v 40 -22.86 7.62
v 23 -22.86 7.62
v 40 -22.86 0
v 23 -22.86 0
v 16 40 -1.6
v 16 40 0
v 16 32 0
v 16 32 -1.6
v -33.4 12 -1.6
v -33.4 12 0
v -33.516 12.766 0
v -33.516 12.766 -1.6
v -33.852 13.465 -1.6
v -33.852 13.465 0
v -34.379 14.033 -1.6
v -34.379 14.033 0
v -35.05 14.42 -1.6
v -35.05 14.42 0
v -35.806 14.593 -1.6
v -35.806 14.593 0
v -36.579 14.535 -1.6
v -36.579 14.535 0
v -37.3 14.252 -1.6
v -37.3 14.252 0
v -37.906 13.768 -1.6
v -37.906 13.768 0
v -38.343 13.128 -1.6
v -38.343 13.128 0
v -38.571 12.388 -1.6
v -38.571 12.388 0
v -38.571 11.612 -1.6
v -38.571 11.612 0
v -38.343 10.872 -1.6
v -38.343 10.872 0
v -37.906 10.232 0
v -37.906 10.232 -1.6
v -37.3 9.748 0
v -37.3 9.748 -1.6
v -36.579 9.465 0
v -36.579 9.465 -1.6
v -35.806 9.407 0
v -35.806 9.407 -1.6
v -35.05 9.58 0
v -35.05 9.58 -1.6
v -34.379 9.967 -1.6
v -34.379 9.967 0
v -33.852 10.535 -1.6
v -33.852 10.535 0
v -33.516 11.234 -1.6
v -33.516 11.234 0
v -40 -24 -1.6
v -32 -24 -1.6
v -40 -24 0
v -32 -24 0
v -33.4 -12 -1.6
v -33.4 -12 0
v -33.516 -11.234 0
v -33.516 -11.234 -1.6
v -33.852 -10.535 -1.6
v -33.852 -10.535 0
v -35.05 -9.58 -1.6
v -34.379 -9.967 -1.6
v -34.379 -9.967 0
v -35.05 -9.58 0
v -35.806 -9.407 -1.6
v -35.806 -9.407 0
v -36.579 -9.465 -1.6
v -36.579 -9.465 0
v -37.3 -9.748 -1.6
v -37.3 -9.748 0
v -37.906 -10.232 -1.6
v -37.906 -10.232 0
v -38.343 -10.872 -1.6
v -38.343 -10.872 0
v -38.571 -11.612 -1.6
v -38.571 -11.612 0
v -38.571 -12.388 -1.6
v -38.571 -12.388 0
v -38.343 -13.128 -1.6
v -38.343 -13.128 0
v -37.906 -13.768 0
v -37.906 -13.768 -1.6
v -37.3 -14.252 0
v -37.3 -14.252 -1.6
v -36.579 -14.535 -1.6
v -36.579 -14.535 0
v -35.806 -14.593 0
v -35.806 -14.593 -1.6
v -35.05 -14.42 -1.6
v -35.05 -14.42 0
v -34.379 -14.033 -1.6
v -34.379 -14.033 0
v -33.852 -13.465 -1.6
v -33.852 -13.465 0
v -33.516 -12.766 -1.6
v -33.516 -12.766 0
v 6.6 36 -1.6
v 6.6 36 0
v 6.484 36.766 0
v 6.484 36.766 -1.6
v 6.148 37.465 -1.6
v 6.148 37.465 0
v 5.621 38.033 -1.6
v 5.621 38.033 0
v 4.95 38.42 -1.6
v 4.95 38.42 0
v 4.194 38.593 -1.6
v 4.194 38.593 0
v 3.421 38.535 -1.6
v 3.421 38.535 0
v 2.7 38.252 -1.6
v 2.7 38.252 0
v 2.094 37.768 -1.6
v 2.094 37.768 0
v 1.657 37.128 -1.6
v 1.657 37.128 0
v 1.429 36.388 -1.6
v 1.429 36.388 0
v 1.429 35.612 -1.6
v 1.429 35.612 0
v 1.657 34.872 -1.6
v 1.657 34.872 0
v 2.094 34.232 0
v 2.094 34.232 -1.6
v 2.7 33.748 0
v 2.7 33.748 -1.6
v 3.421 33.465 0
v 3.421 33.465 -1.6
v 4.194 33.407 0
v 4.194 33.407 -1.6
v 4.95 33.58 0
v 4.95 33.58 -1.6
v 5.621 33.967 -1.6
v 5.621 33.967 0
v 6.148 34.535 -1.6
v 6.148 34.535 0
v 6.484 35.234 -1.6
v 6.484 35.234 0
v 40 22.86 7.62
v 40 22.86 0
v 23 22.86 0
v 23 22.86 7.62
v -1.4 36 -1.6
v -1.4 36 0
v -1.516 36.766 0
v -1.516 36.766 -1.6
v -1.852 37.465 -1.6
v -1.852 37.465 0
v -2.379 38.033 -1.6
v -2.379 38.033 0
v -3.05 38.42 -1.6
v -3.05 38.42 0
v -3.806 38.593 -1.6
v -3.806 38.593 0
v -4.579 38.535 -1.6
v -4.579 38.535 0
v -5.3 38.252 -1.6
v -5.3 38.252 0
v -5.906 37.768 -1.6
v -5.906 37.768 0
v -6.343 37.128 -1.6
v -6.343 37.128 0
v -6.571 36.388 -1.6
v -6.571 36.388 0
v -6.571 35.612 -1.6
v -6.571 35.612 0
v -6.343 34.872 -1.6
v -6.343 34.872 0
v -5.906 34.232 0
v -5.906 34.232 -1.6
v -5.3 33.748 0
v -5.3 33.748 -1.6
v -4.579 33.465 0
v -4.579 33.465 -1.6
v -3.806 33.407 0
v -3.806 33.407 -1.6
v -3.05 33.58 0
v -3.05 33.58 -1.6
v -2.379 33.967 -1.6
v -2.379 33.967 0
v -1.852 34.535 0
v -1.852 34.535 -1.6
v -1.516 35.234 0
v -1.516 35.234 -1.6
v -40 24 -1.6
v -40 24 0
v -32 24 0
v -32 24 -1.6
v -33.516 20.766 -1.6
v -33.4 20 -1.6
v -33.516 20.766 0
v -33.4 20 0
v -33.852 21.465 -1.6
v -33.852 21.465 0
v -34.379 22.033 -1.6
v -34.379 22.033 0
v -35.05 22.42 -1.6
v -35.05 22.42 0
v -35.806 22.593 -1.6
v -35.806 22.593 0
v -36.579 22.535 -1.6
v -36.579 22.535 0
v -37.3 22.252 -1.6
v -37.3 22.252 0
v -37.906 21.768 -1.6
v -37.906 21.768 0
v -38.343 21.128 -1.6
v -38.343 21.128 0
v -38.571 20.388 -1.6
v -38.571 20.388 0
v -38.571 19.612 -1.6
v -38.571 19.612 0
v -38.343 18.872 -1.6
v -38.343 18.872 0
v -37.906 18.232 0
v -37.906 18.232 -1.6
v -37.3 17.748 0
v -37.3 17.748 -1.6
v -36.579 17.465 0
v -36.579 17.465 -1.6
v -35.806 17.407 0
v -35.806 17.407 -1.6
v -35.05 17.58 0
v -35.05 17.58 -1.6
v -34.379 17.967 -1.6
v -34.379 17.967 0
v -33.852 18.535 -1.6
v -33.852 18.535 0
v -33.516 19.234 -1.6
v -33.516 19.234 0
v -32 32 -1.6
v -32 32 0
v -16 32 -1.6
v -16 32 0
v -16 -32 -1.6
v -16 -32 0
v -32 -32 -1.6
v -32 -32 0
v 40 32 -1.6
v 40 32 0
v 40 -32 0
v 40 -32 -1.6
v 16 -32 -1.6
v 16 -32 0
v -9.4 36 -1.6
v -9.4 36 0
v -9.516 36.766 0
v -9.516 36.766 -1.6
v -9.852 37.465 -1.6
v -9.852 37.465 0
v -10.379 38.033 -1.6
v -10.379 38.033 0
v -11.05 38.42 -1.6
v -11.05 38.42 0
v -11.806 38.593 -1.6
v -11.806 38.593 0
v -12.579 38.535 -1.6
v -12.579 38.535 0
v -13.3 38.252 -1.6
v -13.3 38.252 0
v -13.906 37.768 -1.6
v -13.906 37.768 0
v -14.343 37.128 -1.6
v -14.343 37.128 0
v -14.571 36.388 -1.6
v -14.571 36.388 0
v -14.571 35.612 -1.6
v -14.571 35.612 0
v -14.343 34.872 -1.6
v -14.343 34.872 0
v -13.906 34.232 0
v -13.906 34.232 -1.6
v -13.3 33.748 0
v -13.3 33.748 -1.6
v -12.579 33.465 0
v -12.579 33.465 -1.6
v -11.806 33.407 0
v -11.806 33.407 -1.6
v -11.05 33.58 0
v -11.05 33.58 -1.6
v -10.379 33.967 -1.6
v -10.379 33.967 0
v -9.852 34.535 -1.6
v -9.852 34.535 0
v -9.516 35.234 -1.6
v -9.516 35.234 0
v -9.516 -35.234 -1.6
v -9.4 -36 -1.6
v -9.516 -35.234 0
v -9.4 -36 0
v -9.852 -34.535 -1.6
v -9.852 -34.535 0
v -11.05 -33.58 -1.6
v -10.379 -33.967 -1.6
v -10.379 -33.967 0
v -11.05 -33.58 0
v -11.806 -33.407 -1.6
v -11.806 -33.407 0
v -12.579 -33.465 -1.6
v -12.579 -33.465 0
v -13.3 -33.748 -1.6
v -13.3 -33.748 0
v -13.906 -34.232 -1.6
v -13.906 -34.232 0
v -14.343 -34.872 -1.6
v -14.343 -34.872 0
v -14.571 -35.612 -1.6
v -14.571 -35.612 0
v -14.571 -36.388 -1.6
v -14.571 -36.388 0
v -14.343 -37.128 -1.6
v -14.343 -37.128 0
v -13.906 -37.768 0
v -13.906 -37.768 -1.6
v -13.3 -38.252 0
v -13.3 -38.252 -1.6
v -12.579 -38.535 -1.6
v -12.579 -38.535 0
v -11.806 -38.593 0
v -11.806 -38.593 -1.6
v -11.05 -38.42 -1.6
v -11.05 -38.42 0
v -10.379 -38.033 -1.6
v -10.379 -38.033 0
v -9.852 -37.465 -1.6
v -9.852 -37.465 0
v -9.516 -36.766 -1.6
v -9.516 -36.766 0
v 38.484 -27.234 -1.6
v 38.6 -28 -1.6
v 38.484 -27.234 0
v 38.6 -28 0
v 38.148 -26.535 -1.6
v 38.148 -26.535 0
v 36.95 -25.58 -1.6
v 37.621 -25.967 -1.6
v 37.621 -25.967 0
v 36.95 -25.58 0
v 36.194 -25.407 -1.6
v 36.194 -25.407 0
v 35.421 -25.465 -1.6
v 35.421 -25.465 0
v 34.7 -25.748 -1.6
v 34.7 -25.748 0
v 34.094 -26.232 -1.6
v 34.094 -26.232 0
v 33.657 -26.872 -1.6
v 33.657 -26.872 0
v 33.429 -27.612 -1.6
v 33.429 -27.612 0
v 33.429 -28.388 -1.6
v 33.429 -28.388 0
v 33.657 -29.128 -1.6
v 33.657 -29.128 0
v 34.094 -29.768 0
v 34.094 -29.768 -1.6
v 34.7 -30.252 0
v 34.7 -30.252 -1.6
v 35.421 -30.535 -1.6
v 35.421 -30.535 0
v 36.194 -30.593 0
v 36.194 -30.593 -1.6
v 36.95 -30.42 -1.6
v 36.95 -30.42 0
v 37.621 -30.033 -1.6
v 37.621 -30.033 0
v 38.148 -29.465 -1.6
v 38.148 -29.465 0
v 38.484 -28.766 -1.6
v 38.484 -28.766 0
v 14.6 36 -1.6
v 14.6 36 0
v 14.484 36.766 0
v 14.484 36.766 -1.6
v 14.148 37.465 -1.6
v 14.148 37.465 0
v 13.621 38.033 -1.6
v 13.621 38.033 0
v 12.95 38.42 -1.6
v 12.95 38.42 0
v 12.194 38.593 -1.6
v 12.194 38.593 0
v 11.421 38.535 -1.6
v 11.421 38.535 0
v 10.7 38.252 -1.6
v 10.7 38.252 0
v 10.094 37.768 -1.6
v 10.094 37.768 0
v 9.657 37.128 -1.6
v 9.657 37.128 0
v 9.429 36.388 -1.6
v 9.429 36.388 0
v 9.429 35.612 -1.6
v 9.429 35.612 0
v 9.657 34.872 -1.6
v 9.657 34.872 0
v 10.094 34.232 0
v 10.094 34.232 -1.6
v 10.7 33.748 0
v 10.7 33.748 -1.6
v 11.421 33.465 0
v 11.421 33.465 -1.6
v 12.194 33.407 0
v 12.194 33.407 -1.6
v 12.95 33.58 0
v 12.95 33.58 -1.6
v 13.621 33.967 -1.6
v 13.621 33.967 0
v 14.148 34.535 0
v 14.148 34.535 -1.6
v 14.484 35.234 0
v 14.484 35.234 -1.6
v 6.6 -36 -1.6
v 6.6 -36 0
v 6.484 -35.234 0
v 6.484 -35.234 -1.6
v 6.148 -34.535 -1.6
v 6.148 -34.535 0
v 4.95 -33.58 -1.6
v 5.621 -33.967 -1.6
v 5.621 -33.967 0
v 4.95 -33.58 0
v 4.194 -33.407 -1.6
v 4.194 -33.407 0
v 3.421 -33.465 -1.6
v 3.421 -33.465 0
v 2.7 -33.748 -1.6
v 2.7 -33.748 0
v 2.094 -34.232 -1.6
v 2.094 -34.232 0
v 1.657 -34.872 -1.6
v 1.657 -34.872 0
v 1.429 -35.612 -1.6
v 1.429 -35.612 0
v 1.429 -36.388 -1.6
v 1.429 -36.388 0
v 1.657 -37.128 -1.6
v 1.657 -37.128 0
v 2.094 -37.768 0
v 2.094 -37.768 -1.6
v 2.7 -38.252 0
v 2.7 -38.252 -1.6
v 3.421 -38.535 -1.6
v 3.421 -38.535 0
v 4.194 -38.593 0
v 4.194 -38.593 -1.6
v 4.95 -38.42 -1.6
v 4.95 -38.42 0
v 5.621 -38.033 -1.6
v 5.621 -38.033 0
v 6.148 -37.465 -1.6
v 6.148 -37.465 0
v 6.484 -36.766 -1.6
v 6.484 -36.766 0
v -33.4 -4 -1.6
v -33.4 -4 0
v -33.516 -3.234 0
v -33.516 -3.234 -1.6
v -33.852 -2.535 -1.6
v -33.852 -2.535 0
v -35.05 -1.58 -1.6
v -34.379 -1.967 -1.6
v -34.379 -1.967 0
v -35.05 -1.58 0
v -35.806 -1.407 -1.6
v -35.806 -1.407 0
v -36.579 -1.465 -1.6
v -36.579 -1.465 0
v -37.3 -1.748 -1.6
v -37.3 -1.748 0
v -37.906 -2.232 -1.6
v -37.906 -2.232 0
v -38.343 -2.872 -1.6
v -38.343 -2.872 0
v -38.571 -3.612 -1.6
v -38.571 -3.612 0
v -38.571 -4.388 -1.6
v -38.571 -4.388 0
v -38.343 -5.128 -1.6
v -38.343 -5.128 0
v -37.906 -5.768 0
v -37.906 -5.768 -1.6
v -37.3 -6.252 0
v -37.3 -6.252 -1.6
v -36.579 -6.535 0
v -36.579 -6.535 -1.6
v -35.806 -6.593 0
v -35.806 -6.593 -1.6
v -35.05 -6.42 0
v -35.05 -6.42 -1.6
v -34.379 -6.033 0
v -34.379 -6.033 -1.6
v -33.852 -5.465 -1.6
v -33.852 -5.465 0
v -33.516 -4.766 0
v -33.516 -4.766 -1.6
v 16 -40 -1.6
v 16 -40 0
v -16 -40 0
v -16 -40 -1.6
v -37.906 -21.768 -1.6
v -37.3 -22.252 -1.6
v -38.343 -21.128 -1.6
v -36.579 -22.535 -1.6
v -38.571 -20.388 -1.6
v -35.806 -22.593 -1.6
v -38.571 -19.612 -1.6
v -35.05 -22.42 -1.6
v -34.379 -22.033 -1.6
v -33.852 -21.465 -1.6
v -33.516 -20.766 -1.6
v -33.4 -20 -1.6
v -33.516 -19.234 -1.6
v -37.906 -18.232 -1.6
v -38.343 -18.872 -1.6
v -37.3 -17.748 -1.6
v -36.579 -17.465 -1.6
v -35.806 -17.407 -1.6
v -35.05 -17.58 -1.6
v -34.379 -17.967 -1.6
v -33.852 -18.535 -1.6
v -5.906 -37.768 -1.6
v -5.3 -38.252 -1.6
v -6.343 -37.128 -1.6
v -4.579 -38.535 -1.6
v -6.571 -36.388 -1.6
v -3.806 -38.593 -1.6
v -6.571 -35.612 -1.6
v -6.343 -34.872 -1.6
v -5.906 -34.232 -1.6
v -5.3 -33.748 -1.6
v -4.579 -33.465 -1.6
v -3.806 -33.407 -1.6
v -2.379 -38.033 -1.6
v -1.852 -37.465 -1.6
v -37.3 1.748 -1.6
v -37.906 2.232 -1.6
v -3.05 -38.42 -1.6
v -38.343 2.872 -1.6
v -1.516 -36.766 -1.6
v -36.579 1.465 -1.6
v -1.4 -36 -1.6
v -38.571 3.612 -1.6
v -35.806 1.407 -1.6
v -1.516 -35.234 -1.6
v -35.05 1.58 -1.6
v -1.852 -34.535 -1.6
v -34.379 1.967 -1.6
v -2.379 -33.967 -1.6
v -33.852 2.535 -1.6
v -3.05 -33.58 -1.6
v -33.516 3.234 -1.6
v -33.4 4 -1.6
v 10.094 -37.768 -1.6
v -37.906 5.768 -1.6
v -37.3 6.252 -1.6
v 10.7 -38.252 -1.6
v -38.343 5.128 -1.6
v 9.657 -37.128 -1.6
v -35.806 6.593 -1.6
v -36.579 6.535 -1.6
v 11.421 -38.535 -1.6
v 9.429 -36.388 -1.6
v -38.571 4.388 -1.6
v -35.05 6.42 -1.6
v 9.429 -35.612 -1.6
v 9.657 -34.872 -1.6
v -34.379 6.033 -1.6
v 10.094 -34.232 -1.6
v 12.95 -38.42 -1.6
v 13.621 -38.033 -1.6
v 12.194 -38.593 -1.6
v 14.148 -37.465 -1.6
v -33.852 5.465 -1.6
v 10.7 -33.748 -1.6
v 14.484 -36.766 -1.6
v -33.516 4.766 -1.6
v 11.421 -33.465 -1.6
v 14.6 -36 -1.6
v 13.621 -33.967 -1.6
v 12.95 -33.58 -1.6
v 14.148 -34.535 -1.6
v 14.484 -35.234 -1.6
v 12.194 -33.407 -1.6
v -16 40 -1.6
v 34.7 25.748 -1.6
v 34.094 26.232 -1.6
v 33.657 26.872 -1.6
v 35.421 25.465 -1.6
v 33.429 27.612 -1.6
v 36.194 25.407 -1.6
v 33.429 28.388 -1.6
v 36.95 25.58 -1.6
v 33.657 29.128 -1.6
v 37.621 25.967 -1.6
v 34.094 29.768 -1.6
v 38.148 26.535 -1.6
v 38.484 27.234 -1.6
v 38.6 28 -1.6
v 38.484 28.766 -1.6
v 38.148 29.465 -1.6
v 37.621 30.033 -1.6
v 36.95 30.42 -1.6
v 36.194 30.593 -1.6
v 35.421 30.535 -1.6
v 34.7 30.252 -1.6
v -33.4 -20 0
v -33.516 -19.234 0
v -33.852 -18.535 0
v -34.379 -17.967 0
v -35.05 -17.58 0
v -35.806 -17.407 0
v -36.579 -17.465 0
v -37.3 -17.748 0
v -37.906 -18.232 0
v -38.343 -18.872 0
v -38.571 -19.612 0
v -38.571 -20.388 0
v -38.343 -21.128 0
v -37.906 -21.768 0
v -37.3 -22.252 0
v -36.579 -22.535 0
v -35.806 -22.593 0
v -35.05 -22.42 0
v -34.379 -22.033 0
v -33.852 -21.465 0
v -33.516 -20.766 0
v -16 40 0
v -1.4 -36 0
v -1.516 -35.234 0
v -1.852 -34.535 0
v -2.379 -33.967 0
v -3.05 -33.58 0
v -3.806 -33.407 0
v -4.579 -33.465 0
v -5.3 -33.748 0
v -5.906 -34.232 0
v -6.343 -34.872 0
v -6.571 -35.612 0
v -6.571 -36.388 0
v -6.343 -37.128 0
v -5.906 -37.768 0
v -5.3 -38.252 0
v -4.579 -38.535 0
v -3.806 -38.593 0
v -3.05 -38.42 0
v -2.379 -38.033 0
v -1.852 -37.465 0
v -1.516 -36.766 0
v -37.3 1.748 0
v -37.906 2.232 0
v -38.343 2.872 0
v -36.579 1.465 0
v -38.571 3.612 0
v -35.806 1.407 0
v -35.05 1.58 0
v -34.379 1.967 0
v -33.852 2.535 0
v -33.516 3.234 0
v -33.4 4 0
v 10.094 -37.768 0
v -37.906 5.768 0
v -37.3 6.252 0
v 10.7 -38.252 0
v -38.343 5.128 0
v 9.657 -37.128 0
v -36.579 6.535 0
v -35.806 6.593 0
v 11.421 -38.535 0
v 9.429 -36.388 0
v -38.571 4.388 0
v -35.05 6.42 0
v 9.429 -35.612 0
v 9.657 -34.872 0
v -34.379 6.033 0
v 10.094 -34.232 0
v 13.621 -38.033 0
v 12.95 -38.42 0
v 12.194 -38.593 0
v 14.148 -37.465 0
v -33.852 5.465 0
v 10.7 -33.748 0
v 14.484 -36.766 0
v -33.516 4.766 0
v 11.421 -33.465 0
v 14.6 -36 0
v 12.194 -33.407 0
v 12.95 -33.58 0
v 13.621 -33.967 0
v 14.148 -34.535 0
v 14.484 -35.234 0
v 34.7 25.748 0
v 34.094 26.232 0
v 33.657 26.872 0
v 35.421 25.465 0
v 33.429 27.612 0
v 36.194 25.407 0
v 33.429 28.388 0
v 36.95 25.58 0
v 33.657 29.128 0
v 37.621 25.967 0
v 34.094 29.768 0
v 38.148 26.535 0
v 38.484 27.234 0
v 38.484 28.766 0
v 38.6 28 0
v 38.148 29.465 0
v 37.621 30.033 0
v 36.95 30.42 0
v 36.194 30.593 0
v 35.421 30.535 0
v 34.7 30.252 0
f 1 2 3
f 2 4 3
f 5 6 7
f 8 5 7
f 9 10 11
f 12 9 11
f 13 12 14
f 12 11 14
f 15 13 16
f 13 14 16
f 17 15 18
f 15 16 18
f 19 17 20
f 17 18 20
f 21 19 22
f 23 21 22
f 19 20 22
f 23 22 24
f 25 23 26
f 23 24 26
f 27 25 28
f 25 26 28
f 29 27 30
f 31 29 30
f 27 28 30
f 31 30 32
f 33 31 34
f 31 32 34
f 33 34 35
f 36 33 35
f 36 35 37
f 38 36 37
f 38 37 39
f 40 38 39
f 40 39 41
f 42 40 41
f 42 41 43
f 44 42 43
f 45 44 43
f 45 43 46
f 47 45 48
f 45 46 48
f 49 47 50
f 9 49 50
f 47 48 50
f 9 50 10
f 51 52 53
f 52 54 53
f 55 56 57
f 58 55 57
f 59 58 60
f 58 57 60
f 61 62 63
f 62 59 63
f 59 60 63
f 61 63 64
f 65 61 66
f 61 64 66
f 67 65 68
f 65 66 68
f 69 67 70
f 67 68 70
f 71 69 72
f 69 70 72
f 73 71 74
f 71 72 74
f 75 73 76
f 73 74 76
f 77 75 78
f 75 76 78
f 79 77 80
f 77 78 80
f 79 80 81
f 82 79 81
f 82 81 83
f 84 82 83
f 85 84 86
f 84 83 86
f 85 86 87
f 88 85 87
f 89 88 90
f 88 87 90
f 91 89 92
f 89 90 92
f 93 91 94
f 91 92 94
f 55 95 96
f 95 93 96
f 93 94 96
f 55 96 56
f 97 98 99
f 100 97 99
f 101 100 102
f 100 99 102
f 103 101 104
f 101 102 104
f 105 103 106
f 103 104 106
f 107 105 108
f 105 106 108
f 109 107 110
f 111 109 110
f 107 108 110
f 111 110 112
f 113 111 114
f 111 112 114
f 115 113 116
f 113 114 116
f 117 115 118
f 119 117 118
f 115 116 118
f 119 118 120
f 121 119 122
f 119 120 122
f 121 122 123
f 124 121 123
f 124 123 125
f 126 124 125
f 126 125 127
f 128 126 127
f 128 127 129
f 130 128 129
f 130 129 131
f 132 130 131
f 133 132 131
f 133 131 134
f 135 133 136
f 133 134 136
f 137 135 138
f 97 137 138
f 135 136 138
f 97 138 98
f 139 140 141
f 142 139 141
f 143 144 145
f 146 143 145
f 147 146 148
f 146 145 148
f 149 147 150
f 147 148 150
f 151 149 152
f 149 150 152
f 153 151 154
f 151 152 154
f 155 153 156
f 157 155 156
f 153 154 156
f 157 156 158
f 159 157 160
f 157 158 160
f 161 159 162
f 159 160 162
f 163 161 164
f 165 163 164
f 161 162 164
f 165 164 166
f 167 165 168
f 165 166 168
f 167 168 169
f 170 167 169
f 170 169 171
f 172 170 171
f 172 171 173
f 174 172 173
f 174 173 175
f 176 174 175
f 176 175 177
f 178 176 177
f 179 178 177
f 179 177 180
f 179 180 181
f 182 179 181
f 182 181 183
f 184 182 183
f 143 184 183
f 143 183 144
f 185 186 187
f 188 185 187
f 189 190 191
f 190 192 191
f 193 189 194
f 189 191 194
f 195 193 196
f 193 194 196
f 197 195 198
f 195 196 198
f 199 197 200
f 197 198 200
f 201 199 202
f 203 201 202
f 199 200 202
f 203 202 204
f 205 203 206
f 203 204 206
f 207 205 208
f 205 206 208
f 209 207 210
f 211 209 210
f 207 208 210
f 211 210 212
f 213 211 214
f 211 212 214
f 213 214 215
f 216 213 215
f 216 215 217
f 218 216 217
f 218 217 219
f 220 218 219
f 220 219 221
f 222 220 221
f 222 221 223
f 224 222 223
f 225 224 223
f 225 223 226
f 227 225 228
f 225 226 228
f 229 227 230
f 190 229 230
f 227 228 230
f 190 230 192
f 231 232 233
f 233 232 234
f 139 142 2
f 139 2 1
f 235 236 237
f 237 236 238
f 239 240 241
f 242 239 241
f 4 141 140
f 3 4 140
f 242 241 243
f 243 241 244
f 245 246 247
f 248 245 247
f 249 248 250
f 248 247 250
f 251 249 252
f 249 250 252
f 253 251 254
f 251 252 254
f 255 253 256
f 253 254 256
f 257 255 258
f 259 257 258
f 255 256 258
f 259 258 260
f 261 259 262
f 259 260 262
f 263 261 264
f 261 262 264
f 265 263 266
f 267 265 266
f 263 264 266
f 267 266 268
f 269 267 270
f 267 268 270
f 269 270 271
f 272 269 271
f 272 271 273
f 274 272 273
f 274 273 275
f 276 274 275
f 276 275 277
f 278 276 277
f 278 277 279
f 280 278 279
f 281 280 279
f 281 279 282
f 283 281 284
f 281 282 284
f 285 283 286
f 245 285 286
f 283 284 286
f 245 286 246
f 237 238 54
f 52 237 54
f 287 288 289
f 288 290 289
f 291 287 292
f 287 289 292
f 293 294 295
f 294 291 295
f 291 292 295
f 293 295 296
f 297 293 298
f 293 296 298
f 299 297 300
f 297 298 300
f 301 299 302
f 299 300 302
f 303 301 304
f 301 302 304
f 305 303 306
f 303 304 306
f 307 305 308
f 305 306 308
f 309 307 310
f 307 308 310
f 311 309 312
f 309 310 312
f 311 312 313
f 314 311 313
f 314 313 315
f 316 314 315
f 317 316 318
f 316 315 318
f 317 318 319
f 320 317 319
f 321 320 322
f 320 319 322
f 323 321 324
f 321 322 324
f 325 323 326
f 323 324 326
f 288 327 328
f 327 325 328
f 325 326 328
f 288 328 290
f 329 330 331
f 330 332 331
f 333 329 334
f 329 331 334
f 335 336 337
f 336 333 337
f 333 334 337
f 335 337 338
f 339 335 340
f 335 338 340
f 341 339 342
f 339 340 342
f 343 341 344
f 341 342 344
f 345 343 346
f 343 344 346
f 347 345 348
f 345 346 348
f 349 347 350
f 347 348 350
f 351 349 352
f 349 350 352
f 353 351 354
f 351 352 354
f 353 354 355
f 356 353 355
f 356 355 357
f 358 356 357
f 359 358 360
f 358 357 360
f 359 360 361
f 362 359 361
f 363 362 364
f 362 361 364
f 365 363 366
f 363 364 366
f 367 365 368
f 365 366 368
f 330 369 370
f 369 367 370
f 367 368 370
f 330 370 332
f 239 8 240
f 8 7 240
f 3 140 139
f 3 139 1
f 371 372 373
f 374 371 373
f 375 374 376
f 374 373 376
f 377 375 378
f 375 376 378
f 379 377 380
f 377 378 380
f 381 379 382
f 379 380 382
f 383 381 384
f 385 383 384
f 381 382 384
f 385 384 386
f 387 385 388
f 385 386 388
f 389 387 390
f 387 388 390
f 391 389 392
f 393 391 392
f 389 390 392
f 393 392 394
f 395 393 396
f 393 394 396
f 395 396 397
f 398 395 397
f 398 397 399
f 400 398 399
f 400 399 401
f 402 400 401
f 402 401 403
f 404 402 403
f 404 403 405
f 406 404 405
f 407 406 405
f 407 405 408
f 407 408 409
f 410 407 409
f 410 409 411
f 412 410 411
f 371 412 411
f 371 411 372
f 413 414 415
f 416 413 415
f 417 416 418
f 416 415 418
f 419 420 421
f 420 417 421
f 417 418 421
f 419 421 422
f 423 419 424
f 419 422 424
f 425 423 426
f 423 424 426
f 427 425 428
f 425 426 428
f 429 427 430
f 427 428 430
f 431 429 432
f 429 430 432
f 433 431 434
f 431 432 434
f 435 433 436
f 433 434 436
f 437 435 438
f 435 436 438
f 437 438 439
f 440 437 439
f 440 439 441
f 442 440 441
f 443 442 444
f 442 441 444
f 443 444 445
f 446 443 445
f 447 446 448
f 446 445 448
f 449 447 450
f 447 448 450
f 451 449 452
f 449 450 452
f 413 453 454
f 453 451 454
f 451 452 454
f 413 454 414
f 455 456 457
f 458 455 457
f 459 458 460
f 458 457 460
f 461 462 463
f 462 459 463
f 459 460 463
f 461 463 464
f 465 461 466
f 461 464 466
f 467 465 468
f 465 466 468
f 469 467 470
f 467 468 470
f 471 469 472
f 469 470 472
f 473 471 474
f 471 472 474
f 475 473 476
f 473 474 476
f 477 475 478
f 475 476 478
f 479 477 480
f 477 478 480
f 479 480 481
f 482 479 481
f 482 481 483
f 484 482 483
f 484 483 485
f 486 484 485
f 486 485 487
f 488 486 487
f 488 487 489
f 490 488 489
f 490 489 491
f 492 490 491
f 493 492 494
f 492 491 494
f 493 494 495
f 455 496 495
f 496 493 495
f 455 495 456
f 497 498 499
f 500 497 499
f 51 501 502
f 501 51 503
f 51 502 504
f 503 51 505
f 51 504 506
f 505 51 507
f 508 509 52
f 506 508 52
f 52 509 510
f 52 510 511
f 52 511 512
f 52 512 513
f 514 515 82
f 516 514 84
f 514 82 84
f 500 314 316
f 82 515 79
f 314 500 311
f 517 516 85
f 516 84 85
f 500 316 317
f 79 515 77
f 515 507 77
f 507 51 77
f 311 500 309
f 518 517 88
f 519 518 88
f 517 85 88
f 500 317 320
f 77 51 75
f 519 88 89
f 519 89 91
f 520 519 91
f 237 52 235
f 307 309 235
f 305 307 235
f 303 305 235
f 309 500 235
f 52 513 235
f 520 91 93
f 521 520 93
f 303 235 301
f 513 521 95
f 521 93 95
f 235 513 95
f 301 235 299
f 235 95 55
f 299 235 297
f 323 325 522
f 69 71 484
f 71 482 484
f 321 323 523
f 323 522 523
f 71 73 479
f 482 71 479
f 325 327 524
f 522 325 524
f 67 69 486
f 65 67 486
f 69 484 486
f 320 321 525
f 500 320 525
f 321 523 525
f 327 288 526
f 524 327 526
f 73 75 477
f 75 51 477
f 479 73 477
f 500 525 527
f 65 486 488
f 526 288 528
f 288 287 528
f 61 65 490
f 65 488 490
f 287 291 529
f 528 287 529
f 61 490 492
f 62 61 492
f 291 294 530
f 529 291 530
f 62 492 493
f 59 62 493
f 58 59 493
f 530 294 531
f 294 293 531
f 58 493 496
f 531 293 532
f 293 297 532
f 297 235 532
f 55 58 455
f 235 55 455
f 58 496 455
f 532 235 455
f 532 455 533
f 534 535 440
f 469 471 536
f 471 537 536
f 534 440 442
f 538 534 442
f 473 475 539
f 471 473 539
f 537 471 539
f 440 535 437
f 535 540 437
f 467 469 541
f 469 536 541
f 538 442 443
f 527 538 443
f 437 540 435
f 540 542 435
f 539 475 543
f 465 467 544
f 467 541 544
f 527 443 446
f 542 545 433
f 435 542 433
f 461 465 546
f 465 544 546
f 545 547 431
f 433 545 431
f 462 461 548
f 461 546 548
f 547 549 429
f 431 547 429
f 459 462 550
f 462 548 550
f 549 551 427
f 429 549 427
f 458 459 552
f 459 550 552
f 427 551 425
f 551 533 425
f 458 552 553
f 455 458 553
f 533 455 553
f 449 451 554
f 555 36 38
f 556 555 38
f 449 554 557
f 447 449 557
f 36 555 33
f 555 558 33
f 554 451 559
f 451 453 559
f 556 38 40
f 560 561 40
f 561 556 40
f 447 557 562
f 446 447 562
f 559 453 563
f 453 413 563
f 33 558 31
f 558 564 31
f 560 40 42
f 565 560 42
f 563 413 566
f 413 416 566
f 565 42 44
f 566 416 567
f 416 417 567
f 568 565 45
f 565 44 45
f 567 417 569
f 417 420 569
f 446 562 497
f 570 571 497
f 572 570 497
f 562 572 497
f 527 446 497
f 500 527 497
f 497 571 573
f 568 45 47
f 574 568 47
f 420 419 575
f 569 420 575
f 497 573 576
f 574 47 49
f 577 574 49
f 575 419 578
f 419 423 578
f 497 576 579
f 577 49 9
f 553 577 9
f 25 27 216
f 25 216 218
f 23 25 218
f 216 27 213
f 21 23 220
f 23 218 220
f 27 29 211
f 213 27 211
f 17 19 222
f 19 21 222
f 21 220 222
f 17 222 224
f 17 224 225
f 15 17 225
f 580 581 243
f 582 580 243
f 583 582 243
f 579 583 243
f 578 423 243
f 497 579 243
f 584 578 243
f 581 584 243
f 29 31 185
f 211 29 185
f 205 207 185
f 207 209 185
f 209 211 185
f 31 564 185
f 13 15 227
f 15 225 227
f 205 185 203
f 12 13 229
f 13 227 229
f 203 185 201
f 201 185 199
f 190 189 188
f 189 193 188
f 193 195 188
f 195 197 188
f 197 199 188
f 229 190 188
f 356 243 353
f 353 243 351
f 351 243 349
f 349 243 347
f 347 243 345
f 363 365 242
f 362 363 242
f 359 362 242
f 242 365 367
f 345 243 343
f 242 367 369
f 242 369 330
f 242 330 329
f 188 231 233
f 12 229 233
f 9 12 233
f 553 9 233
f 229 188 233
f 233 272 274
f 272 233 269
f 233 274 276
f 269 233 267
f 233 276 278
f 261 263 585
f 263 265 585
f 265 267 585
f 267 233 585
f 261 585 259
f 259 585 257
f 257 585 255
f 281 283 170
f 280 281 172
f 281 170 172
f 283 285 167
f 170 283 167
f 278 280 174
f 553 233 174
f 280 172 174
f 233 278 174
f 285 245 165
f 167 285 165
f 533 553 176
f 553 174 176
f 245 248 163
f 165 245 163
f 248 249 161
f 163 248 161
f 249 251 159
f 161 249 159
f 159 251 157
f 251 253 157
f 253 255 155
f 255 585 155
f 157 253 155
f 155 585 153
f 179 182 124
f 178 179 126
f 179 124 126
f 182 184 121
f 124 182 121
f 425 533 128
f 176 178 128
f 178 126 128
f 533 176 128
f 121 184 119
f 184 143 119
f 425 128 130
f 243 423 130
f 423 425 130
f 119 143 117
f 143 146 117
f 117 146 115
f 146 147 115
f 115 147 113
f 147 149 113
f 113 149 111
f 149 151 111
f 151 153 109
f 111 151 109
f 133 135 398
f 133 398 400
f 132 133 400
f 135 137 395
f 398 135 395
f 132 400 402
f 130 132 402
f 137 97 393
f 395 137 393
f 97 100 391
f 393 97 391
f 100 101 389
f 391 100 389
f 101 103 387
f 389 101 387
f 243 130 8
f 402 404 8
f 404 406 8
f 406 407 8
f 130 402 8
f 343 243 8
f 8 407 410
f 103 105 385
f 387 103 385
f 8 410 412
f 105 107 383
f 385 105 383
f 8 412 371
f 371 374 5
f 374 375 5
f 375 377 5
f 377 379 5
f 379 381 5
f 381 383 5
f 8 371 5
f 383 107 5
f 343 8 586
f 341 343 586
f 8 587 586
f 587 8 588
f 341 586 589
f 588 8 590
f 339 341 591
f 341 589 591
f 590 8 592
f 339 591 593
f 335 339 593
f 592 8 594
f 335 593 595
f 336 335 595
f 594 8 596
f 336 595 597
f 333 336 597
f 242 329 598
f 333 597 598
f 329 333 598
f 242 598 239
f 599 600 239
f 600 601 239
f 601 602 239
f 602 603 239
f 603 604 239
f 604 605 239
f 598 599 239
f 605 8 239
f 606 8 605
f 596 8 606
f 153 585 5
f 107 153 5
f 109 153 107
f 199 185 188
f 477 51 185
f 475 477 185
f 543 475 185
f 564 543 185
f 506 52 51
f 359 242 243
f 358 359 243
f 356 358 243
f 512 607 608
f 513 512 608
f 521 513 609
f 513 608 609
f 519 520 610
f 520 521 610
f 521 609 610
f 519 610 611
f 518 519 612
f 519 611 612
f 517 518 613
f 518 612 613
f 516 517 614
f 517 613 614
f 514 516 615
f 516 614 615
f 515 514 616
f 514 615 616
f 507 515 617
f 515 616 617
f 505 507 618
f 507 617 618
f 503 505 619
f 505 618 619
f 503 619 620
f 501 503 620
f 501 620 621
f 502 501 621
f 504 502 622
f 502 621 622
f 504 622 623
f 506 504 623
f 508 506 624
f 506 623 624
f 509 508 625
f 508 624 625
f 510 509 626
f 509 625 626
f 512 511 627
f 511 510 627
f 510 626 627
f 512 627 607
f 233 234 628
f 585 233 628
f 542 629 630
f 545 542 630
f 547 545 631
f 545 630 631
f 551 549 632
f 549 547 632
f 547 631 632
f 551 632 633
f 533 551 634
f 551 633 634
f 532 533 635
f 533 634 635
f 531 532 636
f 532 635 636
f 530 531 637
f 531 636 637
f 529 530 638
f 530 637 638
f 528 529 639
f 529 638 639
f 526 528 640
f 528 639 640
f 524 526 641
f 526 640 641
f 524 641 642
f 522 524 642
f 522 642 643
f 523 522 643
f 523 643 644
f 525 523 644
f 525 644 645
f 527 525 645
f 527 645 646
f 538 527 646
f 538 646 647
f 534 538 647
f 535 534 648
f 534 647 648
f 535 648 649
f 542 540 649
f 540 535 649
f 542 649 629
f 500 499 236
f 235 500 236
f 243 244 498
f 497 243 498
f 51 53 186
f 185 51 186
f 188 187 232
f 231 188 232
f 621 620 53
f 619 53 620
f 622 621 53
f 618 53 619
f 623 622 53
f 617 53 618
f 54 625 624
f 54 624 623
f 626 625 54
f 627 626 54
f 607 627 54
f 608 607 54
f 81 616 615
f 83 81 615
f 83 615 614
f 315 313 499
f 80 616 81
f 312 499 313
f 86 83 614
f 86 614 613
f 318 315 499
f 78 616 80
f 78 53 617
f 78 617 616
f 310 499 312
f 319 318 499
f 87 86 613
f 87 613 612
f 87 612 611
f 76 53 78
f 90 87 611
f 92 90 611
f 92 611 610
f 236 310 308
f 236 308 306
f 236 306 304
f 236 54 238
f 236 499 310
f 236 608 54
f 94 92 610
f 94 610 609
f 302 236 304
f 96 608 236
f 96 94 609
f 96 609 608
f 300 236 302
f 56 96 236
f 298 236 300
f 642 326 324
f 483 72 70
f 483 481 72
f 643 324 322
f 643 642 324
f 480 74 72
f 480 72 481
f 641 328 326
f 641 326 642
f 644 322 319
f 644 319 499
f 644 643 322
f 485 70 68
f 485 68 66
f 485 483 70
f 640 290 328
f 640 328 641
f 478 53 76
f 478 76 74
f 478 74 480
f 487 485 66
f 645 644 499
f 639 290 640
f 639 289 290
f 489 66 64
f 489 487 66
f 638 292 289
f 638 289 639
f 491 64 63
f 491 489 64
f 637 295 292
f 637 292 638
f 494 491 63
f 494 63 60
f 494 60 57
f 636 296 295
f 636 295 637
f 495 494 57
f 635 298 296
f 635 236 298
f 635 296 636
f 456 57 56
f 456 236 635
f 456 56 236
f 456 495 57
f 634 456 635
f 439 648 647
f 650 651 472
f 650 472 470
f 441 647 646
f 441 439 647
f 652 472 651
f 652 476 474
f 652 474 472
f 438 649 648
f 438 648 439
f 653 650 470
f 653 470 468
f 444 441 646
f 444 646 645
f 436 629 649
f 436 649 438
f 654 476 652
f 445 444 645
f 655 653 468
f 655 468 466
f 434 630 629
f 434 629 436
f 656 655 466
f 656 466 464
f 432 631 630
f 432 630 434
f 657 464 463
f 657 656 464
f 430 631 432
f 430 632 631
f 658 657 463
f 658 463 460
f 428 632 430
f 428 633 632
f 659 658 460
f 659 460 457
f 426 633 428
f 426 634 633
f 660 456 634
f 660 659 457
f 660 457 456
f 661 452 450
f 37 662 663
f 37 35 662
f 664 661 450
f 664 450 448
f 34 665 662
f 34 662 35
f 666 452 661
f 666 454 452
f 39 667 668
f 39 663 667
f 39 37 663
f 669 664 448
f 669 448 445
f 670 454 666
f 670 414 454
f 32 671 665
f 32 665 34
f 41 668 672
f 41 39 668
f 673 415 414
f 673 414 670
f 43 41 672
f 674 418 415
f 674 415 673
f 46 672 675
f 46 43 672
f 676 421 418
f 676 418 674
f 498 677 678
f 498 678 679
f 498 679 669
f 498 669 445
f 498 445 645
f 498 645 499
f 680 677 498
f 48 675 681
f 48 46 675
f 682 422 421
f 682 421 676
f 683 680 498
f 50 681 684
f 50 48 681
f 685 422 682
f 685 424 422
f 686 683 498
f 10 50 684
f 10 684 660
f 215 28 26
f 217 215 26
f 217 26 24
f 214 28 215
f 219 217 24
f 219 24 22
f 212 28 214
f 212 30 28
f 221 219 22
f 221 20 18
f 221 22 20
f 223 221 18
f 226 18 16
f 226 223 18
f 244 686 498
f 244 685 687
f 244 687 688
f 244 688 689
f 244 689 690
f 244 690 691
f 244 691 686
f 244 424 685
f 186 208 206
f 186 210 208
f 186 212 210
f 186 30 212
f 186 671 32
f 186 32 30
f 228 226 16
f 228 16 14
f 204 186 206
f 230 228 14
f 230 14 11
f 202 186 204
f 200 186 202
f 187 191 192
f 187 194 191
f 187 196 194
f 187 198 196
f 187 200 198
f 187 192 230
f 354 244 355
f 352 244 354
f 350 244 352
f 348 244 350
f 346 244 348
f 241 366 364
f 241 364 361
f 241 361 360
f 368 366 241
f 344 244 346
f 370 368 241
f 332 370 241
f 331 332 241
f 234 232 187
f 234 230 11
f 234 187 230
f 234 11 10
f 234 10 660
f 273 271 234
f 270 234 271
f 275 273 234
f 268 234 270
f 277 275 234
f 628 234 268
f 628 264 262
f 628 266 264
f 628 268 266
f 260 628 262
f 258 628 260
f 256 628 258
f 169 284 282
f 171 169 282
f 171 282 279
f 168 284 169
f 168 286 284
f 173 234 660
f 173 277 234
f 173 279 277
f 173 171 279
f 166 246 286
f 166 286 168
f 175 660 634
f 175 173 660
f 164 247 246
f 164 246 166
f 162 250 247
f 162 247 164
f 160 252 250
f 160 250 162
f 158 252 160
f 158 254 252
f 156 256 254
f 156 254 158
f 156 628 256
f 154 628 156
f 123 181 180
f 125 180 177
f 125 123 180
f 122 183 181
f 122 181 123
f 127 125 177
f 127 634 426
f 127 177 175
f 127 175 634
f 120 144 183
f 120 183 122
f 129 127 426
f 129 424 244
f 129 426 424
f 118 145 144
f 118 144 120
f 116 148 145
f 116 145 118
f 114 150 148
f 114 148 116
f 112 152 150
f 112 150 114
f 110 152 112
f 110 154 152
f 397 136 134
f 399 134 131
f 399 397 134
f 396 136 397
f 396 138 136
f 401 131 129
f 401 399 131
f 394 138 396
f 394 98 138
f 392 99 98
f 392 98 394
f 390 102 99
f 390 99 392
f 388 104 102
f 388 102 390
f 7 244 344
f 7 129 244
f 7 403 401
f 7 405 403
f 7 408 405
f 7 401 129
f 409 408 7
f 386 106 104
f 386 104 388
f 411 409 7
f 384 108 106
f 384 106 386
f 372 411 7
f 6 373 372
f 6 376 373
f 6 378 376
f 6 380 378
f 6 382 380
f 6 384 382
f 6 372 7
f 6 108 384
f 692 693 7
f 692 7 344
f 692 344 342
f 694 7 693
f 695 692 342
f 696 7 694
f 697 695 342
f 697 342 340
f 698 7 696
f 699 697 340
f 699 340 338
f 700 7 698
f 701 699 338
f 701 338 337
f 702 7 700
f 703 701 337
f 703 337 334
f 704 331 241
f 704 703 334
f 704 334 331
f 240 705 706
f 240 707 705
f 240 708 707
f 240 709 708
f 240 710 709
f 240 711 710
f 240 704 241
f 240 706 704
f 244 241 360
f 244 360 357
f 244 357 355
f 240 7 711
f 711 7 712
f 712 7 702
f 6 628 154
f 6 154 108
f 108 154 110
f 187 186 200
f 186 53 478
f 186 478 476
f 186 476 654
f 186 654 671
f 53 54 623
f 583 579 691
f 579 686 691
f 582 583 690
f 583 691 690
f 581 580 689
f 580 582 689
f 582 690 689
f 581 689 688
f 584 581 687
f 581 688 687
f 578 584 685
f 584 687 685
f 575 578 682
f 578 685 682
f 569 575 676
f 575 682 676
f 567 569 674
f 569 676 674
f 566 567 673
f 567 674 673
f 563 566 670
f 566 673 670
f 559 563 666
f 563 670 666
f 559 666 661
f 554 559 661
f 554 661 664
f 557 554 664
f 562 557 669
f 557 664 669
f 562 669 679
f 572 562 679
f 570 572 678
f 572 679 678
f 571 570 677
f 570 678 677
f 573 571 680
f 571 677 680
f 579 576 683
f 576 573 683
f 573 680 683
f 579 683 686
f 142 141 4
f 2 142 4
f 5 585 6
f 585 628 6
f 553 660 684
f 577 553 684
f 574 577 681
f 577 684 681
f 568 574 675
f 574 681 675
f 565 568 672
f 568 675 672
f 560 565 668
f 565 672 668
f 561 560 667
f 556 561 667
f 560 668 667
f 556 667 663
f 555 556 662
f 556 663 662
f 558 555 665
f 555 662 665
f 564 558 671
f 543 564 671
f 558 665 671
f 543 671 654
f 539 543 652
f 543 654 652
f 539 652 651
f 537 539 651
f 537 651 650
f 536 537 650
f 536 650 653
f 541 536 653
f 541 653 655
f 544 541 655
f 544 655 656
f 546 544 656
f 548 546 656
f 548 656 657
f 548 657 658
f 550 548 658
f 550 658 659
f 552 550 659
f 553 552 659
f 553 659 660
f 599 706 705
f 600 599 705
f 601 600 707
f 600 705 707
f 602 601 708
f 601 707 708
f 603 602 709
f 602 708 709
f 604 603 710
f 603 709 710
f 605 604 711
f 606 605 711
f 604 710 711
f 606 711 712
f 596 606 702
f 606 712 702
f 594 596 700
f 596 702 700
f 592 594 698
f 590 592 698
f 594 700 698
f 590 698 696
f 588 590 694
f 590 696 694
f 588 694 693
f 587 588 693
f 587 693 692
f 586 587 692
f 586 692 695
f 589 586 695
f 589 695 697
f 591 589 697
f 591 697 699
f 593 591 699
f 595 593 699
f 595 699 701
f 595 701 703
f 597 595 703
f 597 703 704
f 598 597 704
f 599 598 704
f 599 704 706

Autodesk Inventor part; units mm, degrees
ref_plane "YZ Plane" through (0, 0, 0) normal (1, 0, 0) x (0, 1, 0)
ref_plane "XZ Plane" through (0, 0, 0) normal (0, 1, 0) x (-1, 0, 0)
ref_plane "XY Plane" through (0, 0, 0) normal (0, 0, 1) x (1, 0, 0)
sketch "Sketch1" plane through (0, 0, 0) normal (0, 0, 1) x (1, 0, 0)
  line L0 (0, 0) -> (-40, 0)
  line L1 (-40, 0) -> (-40, 24)
  line L2 (-40, 24) -> (-32, 24)
  line L3 (-32, 24) -> (-32, 32)
  line L4 (-32, 32) -> (-16, 32)
  line L5 (-16, 32) -> (-16, 40)
  line L6 (-16, 40) -> (16, 40)
  line L7 (16, 40) -> (16, 32)
  line L8 (16, 32) -> (40, 32)
  line L9 (40, 32) -> (40, 0)
  line L10 (40, 0) -> (0, 0)
  line L11 (-36, 0) -> (-36, 24) construction
  line L12 (-16, 36) -> (16, 36) construction
  circle A0 centre (-36, 20) radius 2.6
  circle A1 centre (-36, 12) radius 2.6
  circle A2 centre (-36, 4) radius 2.6
  circle A3 centre (36, 28) radius 2.6
  circle A4 centre (-12, 36) radius 2.6
  circle A5 centre (-4, 36) radius 2.6
  circle A6 centre (4, 36) radius 2.6
  circle A7 centre (12, 36) radius 2.6
  line L13 (40, 22.86) -> (23, 22.86)
  line L14 (23, 22.86) -> (23, 0)
  dimension "d0" = 40
  dimension "d1" = 24
  dimension "d2" = 8
  dimension "d3" = 8
  dimension "d4" = 16
  dimension "d5" = 8
  dimension "d6" = 32
  dimension "d7" = 8
  dimension "d8" = 24
  dimension "d9" = 5.2
  dimension "d10" = 4
  dimension "d11" = 8
  dimension "d12" = 4
  dimension "d13" = 4
  dimension "d14" = 4
  dimension "d15" = 4
  dimension "d16" = 8
  dimension "d17" = 8
  dimension "d18" = 8
  dimension "d21" = 17
  dimension "d22" = 22.86
extrude "Extrusion1" add sketch "Sketch1" against normal blind 1.6
extrude "Extrusion2" add sketch "Sketch1" along normal blind 7.62 separate body contours L14 L13 L9 L10
mirror "Mirror1" about plane through (0, 0, 0) normal (0, -1, 0) of "Extrusion1" bodies 1
mirror "Mirror2" about plane through (23, 0, 0) normal (0, -1, 0) of "Extrusion2" bodies 2
properties part number "legoduino"
